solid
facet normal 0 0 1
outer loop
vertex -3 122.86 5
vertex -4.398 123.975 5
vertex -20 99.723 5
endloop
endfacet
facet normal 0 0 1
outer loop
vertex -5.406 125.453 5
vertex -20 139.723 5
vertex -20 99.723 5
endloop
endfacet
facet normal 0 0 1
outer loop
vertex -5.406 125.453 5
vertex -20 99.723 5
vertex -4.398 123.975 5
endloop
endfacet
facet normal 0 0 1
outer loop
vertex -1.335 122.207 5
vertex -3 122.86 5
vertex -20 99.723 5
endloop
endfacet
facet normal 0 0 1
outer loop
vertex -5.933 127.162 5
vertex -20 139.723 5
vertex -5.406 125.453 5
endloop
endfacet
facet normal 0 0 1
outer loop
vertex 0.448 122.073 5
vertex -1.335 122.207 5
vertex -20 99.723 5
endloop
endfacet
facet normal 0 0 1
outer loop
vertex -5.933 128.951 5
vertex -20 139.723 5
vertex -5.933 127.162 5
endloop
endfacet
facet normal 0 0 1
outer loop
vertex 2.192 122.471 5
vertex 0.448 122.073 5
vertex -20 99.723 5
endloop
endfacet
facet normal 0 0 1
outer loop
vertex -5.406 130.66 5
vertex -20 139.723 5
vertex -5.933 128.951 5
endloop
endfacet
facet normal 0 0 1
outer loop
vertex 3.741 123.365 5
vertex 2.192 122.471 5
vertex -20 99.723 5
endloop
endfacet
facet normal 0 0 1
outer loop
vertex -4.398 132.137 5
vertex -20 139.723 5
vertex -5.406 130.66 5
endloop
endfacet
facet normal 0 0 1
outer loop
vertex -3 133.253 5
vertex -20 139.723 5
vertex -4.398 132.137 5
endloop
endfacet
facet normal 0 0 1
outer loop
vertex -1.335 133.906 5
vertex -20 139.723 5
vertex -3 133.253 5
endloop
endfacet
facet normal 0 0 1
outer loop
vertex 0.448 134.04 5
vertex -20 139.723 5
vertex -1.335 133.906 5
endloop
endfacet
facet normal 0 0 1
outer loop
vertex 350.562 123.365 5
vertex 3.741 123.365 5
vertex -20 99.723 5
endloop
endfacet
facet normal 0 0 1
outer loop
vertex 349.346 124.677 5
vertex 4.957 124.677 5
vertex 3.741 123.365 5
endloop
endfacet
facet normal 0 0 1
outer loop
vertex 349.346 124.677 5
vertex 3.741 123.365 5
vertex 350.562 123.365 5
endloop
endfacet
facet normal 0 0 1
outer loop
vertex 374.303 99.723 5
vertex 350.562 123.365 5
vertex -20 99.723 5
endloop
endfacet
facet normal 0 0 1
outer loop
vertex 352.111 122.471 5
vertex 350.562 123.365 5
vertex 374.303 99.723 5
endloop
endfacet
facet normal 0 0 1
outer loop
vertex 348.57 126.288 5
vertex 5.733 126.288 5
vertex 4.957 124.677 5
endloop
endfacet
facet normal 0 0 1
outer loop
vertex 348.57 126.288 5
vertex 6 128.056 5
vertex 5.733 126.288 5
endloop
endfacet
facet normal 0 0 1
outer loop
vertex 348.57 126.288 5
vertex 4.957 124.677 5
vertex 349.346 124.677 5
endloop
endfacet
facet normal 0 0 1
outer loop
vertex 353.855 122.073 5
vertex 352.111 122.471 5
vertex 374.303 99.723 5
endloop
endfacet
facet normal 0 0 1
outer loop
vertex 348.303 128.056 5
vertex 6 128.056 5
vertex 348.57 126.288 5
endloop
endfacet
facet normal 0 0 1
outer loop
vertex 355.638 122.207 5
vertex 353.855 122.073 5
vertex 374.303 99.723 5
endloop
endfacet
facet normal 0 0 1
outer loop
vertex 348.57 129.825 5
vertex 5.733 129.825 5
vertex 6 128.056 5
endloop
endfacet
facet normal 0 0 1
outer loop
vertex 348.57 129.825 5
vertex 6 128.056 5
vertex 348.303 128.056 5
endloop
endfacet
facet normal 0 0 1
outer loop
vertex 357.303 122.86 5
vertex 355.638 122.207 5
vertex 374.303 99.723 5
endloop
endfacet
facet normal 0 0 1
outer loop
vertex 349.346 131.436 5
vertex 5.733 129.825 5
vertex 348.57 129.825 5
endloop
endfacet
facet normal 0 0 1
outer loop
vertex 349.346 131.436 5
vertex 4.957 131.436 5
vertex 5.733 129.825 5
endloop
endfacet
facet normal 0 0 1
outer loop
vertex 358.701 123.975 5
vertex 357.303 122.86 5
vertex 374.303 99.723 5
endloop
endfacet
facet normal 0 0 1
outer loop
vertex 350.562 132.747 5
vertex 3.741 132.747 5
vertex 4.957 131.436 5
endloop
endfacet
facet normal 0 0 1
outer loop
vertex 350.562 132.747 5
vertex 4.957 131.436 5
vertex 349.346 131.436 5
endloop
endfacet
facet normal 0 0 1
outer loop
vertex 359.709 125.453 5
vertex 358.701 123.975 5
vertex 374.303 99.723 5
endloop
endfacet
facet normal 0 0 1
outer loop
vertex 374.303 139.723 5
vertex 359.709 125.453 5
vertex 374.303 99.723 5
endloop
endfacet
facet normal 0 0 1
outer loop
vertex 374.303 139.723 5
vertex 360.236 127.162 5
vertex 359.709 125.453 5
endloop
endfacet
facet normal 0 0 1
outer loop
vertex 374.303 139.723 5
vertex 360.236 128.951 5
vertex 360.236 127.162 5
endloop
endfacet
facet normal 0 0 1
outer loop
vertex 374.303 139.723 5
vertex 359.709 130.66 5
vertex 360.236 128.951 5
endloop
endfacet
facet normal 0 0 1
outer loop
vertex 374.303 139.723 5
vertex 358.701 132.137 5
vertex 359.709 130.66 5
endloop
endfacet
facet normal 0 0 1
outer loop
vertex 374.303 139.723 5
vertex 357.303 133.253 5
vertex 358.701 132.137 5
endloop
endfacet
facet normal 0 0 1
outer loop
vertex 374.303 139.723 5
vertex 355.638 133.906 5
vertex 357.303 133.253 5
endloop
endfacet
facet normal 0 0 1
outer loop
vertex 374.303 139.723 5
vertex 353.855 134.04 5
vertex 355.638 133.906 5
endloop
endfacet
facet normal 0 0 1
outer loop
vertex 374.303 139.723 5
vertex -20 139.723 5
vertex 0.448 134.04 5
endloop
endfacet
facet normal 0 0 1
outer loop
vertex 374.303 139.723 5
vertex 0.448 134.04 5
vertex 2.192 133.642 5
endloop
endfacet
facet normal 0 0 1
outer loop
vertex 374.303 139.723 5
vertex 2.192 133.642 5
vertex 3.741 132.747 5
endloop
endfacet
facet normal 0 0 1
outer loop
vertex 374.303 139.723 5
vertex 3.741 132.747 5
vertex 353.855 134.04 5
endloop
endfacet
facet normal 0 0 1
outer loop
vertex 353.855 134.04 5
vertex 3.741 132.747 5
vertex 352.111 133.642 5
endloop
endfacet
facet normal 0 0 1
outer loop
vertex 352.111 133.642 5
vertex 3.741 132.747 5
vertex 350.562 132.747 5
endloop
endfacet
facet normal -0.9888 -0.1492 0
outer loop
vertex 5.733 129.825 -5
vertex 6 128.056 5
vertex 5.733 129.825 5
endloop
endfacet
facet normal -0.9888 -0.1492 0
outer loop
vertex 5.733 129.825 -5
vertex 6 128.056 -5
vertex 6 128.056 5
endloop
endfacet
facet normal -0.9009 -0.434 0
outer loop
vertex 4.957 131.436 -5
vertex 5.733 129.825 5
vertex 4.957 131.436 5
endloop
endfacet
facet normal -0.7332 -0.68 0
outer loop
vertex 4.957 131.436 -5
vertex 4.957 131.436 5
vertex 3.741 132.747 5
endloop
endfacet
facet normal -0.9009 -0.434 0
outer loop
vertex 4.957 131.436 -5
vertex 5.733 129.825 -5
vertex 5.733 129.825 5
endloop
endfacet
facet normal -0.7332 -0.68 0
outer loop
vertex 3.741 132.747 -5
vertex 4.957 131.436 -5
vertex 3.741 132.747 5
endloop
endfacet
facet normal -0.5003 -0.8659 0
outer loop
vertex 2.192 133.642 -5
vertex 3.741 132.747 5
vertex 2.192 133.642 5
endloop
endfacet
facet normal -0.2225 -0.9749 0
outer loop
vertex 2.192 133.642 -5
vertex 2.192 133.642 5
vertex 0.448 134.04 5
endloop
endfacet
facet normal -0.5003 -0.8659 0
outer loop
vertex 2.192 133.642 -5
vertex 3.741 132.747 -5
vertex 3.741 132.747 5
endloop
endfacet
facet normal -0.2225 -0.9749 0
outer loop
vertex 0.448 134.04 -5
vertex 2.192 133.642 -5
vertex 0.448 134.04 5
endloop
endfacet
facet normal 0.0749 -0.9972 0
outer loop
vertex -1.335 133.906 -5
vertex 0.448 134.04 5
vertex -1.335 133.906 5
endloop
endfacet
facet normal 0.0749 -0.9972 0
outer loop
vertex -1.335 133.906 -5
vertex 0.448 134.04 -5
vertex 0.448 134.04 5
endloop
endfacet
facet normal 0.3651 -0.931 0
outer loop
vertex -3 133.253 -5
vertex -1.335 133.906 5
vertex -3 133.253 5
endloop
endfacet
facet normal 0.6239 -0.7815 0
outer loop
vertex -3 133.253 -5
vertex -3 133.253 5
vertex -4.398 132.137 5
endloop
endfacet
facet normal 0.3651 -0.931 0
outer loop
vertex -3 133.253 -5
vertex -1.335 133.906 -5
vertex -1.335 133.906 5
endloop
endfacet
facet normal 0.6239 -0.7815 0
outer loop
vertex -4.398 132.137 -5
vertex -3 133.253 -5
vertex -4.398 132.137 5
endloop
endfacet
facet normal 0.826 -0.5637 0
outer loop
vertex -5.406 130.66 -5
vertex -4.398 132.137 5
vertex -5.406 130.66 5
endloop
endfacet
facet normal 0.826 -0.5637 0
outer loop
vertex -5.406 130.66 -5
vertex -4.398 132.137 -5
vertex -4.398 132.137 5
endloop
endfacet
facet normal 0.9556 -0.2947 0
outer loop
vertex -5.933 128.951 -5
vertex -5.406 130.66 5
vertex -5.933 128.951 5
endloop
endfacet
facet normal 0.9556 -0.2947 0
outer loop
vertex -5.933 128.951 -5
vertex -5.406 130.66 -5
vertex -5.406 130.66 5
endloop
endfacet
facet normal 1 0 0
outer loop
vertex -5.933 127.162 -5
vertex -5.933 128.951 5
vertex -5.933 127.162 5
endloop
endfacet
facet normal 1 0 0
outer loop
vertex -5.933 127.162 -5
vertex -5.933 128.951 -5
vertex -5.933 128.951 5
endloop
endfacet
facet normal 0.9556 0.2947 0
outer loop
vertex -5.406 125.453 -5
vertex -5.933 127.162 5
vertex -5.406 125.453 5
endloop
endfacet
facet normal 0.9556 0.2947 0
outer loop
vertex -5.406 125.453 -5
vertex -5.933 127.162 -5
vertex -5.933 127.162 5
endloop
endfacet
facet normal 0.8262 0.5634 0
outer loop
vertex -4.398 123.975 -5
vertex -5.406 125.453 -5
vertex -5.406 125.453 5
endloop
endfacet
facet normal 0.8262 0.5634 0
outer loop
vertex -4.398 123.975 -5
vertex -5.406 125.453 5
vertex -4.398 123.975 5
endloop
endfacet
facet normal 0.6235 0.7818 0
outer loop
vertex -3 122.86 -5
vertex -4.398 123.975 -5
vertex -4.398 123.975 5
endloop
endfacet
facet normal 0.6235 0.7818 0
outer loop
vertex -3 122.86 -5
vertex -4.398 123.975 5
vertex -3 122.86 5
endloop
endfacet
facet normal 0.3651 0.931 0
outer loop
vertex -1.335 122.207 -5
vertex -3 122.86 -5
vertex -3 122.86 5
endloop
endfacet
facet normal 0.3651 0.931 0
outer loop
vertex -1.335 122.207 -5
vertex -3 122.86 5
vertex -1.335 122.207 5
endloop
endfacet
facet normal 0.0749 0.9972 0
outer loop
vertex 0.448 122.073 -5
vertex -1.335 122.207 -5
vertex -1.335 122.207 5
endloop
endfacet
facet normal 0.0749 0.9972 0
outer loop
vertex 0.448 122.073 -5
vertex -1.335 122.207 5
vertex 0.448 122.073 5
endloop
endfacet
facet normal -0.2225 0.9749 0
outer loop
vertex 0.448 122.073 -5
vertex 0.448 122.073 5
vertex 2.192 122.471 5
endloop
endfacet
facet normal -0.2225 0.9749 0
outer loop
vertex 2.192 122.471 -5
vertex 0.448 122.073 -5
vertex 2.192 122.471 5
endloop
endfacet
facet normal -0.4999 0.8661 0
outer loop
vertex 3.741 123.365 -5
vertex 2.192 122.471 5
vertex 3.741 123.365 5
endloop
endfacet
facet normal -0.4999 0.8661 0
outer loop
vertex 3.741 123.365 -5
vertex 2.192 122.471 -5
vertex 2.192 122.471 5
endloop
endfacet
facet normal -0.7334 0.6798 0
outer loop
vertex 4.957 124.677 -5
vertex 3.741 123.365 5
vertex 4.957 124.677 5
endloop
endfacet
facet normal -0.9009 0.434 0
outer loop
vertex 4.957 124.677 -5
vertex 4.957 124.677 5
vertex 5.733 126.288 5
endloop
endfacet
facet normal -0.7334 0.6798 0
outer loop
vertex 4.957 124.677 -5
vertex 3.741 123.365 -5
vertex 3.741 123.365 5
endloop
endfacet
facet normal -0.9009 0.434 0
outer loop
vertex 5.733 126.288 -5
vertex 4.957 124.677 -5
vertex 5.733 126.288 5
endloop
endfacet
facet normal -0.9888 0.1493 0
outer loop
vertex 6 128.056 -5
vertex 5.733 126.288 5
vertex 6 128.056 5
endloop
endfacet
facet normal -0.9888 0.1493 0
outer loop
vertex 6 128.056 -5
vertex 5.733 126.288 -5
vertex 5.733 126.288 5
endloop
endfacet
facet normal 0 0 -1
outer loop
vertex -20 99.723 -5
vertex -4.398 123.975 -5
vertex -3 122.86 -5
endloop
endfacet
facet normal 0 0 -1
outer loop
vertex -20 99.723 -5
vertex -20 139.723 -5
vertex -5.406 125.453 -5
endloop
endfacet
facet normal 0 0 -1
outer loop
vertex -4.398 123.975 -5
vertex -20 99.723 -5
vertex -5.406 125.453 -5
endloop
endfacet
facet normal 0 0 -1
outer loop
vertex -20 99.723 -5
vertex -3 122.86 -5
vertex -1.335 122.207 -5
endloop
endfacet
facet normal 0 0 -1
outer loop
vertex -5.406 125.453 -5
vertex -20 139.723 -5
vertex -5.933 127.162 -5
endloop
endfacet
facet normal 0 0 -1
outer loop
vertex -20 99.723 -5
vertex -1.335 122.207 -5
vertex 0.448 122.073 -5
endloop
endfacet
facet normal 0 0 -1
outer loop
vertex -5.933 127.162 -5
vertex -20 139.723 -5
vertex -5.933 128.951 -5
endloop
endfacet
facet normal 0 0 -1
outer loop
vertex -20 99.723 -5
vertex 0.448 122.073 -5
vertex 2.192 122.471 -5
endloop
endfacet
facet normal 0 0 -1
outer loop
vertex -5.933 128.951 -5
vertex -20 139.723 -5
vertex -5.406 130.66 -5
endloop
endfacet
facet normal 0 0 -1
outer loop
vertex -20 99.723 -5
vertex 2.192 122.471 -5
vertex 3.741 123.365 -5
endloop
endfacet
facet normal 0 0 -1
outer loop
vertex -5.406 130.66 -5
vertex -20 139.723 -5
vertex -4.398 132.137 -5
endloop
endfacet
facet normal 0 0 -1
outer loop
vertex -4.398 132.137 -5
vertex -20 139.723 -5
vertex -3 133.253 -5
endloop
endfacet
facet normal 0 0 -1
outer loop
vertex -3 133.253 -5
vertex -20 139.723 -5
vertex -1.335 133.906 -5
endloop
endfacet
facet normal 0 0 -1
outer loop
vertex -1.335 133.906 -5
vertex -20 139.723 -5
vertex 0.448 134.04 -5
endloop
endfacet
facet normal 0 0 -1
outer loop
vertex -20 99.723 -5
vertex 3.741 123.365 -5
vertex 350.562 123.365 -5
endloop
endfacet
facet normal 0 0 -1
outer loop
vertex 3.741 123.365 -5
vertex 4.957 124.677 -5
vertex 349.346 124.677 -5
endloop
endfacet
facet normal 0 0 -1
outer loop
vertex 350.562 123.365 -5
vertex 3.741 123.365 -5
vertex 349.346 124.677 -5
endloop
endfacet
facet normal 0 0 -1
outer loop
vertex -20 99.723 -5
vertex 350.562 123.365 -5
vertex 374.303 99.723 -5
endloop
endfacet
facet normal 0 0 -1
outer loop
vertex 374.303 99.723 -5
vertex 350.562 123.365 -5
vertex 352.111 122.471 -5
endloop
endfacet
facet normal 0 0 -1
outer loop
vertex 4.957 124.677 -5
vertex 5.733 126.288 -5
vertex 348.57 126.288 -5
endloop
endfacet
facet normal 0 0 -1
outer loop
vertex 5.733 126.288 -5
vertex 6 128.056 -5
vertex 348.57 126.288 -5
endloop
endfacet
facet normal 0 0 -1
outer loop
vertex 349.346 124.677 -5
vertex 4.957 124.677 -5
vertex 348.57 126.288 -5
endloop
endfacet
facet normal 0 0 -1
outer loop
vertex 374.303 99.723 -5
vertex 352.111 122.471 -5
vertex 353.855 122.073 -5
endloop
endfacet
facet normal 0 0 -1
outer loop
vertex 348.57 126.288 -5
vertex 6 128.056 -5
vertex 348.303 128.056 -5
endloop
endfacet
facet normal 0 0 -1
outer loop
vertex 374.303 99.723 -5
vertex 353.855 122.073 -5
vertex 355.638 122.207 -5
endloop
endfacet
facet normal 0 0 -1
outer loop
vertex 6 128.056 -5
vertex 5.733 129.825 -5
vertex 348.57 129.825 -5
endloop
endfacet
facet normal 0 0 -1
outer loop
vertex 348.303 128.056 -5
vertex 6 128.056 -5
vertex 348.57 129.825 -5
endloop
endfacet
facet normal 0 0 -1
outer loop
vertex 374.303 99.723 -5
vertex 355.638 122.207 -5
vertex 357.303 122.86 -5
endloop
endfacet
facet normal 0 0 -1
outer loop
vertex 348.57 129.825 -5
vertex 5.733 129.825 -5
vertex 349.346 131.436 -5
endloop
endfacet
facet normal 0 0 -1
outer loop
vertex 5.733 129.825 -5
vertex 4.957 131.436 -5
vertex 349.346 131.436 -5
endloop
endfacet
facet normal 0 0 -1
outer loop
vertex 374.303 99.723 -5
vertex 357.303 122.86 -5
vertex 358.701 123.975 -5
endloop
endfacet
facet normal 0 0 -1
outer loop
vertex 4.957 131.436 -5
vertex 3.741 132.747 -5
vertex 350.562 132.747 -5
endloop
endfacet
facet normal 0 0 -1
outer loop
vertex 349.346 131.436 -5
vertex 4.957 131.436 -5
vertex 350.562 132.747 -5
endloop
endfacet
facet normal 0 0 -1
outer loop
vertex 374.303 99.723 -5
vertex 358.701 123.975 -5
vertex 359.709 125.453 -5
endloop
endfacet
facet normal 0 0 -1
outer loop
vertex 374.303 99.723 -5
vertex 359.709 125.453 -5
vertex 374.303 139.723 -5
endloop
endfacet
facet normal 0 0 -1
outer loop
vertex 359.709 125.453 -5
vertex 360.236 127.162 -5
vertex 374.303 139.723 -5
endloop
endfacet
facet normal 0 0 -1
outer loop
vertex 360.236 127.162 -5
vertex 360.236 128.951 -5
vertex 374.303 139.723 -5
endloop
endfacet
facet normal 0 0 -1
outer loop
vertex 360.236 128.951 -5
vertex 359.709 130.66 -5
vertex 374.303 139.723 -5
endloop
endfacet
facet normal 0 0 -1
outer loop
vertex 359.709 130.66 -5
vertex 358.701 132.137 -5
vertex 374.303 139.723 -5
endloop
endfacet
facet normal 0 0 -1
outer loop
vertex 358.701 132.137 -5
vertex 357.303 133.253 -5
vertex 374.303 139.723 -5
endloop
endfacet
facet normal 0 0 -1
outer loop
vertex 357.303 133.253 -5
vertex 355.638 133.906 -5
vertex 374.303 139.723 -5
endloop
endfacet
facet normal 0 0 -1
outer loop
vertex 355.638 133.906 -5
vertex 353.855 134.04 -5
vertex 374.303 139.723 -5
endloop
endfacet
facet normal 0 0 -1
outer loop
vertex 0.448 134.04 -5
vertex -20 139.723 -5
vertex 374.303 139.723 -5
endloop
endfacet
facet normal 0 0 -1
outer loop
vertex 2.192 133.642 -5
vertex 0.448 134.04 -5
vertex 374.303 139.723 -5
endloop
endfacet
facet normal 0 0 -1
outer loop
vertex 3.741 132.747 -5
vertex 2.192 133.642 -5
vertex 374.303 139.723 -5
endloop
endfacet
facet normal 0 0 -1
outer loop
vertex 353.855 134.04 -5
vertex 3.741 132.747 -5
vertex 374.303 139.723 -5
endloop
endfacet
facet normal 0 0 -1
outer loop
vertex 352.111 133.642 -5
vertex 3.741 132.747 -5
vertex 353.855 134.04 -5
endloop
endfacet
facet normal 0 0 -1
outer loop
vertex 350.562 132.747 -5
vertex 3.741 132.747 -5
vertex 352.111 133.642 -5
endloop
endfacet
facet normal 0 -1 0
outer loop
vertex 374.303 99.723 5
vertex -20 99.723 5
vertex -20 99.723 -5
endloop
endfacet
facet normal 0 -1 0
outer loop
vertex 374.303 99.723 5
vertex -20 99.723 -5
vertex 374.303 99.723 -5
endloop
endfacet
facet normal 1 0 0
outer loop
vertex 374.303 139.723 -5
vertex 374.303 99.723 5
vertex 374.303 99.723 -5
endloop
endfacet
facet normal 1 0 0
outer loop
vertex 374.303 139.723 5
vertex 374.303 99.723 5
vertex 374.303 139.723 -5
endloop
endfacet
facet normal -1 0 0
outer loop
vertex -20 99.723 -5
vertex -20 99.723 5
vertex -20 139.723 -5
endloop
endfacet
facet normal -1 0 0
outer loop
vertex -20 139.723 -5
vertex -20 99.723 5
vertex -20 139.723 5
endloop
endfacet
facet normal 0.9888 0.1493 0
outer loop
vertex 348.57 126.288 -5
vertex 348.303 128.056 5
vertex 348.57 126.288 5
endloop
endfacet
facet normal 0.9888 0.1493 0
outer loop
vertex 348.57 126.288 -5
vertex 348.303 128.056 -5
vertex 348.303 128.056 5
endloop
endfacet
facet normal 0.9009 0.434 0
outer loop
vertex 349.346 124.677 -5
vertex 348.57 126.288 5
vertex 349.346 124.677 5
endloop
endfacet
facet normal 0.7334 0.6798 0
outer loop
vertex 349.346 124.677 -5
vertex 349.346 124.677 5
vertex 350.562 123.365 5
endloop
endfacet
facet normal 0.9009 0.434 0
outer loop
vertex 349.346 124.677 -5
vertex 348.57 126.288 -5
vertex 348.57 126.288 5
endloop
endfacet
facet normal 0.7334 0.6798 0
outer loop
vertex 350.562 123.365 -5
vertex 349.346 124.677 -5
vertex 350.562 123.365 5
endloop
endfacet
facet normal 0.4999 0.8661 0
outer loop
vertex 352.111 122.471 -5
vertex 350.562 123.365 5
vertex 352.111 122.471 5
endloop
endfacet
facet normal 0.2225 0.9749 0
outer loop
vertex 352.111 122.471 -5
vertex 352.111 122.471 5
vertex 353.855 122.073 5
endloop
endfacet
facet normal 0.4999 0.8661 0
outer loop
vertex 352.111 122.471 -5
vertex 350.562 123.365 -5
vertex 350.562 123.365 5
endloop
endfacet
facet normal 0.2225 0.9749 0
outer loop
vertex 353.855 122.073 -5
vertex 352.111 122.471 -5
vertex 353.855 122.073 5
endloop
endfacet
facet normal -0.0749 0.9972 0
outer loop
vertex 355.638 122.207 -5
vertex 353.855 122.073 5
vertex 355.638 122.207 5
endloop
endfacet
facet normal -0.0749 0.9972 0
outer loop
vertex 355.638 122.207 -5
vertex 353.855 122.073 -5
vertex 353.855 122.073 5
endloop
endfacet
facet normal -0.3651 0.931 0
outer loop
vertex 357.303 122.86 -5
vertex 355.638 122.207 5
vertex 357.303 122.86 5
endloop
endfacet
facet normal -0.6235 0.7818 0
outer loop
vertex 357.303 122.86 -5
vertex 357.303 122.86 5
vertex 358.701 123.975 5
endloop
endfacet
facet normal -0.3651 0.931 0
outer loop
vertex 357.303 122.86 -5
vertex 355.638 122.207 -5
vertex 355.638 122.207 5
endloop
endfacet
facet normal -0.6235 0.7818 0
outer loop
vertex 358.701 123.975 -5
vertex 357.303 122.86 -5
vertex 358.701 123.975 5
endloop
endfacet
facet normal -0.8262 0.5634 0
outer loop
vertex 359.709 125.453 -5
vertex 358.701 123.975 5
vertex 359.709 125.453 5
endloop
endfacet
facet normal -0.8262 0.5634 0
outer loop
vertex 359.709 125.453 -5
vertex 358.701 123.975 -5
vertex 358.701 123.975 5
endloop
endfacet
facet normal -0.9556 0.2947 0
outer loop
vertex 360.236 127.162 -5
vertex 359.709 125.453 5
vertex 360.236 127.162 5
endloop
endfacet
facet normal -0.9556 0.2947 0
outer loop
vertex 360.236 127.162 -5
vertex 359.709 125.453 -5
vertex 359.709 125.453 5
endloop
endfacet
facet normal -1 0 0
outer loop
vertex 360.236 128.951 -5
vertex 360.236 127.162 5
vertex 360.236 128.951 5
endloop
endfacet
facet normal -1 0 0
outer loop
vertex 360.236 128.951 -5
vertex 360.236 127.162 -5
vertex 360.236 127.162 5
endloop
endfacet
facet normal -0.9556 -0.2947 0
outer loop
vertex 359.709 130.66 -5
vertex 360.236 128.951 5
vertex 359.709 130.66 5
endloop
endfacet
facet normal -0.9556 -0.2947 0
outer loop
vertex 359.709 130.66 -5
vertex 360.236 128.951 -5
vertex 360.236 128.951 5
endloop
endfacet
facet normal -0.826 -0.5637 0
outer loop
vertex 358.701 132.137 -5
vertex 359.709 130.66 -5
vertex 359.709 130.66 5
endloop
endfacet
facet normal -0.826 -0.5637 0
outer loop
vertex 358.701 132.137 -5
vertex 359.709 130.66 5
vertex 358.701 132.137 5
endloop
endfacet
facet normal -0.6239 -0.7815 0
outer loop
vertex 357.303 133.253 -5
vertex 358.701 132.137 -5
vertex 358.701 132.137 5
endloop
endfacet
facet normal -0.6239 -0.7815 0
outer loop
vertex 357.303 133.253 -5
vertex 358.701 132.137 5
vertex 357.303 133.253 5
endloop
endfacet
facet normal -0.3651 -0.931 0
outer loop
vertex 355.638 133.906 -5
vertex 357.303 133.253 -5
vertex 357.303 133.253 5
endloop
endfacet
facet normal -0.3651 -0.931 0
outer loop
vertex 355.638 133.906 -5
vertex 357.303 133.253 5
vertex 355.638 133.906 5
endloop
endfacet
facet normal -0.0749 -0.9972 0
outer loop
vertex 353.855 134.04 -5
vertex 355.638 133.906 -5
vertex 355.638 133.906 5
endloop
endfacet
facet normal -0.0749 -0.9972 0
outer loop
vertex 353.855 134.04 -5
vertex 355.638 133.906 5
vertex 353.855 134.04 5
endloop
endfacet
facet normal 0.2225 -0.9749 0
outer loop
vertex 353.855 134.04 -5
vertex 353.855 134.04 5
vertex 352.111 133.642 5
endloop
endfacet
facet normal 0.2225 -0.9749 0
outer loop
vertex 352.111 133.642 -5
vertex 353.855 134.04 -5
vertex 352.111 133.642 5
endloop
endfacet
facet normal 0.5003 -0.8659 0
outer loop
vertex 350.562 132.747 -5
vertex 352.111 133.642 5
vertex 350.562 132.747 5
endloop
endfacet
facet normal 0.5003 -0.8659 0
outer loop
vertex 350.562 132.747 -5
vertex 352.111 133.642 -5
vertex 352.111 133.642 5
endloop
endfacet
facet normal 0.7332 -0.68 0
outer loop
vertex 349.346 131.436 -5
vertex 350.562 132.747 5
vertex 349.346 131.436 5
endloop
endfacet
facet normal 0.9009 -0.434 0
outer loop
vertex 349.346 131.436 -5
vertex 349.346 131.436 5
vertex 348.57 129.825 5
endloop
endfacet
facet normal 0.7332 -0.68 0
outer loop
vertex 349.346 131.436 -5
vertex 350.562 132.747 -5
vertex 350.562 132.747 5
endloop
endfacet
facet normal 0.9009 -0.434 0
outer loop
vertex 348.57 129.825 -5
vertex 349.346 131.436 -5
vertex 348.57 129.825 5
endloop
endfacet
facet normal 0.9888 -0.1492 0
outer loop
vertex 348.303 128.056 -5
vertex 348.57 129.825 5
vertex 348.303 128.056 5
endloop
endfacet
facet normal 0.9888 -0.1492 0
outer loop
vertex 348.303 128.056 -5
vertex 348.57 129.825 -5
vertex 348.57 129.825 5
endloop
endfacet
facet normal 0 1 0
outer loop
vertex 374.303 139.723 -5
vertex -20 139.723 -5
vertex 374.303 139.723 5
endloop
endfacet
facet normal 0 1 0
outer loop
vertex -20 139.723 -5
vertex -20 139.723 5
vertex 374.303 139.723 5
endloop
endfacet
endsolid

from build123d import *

# Parameters (mm, degrees)
SCHIZZO1_W                   = 394.303075113
SCHIZZO1_H                   = 40
SCHIZZO1_R                   = 6
ESTRUSIONE_ESTRUSIONE1_DEPTH = 5


with BuildPart() as part:
    # Schizzo1 → Estrusione-Estrusione1 (new, symmetric)
    with BuildSketch(Plane.XY):
        with Locations((177.151537557, 119.723097721)):
            Rectangle(SCHIZZO1_W, SCHIZZO1_H)
        with Locations((0, 128.056431054)):
            Circle(SCHIZZO1_R, mode=Mode.SUBTRACT)
        with Locations(Location((354.303075113, 128.056431054, 0), (0, 0, 180))):
            Circle(SCHIZZO1_R, mode=Mode.SUBTRACT)
    extrude(amount=ESTRUSIONE_ESTRUSIONE1_DEPTH, both=True)


solid = part.part
